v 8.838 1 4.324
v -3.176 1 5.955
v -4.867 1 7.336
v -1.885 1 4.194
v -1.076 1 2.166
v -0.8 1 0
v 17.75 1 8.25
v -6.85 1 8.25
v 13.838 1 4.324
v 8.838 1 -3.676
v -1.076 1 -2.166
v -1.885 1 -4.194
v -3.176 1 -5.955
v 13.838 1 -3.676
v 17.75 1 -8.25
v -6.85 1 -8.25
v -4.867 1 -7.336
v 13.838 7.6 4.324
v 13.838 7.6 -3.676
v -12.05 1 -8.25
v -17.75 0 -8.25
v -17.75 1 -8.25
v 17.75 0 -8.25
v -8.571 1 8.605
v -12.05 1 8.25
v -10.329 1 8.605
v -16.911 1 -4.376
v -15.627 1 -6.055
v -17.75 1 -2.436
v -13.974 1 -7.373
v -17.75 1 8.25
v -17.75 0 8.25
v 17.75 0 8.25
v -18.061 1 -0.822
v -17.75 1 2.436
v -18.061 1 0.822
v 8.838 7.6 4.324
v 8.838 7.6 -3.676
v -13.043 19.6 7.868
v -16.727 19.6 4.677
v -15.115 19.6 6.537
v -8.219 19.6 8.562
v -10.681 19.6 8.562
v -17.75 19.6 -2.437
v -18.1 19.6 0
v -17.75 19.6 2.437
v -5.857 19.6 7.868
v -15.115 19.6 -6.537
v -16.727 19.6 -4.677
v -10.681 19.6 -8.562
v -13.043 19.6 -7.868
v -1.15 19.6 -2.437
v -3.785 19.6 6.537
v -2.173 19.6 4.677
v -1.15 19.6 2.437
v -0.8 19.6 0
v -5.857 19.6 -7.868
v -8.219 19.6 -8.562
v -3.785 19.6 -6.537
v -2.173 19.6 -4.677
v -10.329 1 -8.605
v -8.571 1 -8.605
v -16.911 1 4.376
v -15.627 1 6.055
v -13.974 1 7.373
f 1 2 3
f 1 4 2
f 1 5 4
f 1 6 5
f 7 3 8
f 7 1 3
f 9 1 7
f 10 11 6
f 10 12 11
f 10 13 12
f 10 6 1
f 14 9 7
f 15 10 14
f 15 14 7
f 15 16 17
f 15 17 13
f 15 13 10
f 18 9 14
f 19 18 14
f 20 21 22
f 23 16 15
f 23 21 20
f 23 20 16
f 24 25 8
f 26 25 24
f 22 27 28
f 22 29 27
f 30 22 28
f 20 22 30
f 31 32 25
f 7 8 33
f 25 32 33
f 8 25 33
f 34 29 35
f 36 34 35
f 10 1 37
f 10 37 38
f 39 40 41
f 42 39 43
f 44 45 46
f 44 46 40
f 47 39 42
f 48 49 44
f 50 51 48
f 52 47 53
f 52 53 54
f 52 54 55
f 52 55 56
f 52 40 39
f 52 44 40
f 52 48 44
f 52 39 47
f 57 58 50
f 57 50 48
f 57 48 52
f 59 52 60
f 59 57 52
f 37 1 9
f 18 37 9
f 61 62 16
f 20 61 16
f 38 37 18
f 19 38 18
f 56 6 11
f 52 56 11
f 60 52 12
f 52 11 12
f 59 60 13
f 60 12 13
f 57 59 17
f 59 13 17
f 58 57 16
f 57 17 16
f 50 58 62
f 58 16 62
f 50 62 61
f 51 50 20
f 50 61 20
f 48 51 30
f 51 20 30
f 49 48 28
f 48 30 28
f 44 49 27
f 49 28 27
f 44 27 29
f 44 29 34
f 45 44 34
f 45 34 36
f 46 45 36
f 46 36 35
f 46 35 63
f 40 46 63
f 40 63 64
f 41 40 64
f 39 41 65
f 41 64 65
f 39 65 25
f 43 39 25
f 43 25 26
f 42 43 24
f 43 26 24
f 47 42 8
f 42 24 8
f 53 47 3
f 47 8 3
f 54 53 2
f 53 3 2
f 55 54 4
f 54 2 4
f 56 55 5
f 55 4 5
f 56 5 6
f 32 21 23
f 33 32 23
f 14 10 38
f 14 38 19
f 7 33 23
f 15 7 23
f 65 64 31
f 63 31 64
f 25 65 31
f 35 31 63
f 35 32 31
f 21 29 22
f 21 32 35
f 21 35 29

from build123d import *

# Parameters (mm, degrees)
SKETCH1_W           = 35.5
SKETCH1_H           = 16.5
BOSS_EXTRUDE1_DEPTH = 1
SKETCH2_R           = 8.65
BOSS_EXTRUDE2_DEPTH = 18.6
SKETCH3_W           = 5
SKETCH3_H           = 8
BOSS_EXTRUDE3_DEPTH = 6.6


with BuildPart() as part:
    # Sketch1 → Boss-Extrude1 (new body)
    with BuildSketch(Plane(origin=(0, 0, 0), x_dir=(1, 0, 0), z_dir=(0, 1, 0))):
        Rectangle(SKETCH1_W, SKETCH1_H)
    extrude(amount=BOSS_EXTRUDE1_DEPTH)

    # Sketch2 → Boss-Extrude2 (add)
    with BuildSketch(Plane(origin=(0, 1, 0), x_dir=(1, 0, 0), z_dir=(0, 1, 0))):
        with Locations((-9.45, 0)):
            Circle(SKETCH2_R)
    extrude(amount=BOSS_EXTRUDE2_DEPTH)

    # Sketch3 → Boss-Extrude3 (add)
    with BuildSketch(Plane(origin=(0, 1, 0), x_dir=(1, 0, 0), z_dir=(0, 1, 0))):
        with Locations((11.337780318, -0.323708933)):
            Rectangle(SKETCH3_W, SKETCH3_H)
    extrude(amount=BOSS_EXTRUDE3_DEPTH)


solid = part.part
